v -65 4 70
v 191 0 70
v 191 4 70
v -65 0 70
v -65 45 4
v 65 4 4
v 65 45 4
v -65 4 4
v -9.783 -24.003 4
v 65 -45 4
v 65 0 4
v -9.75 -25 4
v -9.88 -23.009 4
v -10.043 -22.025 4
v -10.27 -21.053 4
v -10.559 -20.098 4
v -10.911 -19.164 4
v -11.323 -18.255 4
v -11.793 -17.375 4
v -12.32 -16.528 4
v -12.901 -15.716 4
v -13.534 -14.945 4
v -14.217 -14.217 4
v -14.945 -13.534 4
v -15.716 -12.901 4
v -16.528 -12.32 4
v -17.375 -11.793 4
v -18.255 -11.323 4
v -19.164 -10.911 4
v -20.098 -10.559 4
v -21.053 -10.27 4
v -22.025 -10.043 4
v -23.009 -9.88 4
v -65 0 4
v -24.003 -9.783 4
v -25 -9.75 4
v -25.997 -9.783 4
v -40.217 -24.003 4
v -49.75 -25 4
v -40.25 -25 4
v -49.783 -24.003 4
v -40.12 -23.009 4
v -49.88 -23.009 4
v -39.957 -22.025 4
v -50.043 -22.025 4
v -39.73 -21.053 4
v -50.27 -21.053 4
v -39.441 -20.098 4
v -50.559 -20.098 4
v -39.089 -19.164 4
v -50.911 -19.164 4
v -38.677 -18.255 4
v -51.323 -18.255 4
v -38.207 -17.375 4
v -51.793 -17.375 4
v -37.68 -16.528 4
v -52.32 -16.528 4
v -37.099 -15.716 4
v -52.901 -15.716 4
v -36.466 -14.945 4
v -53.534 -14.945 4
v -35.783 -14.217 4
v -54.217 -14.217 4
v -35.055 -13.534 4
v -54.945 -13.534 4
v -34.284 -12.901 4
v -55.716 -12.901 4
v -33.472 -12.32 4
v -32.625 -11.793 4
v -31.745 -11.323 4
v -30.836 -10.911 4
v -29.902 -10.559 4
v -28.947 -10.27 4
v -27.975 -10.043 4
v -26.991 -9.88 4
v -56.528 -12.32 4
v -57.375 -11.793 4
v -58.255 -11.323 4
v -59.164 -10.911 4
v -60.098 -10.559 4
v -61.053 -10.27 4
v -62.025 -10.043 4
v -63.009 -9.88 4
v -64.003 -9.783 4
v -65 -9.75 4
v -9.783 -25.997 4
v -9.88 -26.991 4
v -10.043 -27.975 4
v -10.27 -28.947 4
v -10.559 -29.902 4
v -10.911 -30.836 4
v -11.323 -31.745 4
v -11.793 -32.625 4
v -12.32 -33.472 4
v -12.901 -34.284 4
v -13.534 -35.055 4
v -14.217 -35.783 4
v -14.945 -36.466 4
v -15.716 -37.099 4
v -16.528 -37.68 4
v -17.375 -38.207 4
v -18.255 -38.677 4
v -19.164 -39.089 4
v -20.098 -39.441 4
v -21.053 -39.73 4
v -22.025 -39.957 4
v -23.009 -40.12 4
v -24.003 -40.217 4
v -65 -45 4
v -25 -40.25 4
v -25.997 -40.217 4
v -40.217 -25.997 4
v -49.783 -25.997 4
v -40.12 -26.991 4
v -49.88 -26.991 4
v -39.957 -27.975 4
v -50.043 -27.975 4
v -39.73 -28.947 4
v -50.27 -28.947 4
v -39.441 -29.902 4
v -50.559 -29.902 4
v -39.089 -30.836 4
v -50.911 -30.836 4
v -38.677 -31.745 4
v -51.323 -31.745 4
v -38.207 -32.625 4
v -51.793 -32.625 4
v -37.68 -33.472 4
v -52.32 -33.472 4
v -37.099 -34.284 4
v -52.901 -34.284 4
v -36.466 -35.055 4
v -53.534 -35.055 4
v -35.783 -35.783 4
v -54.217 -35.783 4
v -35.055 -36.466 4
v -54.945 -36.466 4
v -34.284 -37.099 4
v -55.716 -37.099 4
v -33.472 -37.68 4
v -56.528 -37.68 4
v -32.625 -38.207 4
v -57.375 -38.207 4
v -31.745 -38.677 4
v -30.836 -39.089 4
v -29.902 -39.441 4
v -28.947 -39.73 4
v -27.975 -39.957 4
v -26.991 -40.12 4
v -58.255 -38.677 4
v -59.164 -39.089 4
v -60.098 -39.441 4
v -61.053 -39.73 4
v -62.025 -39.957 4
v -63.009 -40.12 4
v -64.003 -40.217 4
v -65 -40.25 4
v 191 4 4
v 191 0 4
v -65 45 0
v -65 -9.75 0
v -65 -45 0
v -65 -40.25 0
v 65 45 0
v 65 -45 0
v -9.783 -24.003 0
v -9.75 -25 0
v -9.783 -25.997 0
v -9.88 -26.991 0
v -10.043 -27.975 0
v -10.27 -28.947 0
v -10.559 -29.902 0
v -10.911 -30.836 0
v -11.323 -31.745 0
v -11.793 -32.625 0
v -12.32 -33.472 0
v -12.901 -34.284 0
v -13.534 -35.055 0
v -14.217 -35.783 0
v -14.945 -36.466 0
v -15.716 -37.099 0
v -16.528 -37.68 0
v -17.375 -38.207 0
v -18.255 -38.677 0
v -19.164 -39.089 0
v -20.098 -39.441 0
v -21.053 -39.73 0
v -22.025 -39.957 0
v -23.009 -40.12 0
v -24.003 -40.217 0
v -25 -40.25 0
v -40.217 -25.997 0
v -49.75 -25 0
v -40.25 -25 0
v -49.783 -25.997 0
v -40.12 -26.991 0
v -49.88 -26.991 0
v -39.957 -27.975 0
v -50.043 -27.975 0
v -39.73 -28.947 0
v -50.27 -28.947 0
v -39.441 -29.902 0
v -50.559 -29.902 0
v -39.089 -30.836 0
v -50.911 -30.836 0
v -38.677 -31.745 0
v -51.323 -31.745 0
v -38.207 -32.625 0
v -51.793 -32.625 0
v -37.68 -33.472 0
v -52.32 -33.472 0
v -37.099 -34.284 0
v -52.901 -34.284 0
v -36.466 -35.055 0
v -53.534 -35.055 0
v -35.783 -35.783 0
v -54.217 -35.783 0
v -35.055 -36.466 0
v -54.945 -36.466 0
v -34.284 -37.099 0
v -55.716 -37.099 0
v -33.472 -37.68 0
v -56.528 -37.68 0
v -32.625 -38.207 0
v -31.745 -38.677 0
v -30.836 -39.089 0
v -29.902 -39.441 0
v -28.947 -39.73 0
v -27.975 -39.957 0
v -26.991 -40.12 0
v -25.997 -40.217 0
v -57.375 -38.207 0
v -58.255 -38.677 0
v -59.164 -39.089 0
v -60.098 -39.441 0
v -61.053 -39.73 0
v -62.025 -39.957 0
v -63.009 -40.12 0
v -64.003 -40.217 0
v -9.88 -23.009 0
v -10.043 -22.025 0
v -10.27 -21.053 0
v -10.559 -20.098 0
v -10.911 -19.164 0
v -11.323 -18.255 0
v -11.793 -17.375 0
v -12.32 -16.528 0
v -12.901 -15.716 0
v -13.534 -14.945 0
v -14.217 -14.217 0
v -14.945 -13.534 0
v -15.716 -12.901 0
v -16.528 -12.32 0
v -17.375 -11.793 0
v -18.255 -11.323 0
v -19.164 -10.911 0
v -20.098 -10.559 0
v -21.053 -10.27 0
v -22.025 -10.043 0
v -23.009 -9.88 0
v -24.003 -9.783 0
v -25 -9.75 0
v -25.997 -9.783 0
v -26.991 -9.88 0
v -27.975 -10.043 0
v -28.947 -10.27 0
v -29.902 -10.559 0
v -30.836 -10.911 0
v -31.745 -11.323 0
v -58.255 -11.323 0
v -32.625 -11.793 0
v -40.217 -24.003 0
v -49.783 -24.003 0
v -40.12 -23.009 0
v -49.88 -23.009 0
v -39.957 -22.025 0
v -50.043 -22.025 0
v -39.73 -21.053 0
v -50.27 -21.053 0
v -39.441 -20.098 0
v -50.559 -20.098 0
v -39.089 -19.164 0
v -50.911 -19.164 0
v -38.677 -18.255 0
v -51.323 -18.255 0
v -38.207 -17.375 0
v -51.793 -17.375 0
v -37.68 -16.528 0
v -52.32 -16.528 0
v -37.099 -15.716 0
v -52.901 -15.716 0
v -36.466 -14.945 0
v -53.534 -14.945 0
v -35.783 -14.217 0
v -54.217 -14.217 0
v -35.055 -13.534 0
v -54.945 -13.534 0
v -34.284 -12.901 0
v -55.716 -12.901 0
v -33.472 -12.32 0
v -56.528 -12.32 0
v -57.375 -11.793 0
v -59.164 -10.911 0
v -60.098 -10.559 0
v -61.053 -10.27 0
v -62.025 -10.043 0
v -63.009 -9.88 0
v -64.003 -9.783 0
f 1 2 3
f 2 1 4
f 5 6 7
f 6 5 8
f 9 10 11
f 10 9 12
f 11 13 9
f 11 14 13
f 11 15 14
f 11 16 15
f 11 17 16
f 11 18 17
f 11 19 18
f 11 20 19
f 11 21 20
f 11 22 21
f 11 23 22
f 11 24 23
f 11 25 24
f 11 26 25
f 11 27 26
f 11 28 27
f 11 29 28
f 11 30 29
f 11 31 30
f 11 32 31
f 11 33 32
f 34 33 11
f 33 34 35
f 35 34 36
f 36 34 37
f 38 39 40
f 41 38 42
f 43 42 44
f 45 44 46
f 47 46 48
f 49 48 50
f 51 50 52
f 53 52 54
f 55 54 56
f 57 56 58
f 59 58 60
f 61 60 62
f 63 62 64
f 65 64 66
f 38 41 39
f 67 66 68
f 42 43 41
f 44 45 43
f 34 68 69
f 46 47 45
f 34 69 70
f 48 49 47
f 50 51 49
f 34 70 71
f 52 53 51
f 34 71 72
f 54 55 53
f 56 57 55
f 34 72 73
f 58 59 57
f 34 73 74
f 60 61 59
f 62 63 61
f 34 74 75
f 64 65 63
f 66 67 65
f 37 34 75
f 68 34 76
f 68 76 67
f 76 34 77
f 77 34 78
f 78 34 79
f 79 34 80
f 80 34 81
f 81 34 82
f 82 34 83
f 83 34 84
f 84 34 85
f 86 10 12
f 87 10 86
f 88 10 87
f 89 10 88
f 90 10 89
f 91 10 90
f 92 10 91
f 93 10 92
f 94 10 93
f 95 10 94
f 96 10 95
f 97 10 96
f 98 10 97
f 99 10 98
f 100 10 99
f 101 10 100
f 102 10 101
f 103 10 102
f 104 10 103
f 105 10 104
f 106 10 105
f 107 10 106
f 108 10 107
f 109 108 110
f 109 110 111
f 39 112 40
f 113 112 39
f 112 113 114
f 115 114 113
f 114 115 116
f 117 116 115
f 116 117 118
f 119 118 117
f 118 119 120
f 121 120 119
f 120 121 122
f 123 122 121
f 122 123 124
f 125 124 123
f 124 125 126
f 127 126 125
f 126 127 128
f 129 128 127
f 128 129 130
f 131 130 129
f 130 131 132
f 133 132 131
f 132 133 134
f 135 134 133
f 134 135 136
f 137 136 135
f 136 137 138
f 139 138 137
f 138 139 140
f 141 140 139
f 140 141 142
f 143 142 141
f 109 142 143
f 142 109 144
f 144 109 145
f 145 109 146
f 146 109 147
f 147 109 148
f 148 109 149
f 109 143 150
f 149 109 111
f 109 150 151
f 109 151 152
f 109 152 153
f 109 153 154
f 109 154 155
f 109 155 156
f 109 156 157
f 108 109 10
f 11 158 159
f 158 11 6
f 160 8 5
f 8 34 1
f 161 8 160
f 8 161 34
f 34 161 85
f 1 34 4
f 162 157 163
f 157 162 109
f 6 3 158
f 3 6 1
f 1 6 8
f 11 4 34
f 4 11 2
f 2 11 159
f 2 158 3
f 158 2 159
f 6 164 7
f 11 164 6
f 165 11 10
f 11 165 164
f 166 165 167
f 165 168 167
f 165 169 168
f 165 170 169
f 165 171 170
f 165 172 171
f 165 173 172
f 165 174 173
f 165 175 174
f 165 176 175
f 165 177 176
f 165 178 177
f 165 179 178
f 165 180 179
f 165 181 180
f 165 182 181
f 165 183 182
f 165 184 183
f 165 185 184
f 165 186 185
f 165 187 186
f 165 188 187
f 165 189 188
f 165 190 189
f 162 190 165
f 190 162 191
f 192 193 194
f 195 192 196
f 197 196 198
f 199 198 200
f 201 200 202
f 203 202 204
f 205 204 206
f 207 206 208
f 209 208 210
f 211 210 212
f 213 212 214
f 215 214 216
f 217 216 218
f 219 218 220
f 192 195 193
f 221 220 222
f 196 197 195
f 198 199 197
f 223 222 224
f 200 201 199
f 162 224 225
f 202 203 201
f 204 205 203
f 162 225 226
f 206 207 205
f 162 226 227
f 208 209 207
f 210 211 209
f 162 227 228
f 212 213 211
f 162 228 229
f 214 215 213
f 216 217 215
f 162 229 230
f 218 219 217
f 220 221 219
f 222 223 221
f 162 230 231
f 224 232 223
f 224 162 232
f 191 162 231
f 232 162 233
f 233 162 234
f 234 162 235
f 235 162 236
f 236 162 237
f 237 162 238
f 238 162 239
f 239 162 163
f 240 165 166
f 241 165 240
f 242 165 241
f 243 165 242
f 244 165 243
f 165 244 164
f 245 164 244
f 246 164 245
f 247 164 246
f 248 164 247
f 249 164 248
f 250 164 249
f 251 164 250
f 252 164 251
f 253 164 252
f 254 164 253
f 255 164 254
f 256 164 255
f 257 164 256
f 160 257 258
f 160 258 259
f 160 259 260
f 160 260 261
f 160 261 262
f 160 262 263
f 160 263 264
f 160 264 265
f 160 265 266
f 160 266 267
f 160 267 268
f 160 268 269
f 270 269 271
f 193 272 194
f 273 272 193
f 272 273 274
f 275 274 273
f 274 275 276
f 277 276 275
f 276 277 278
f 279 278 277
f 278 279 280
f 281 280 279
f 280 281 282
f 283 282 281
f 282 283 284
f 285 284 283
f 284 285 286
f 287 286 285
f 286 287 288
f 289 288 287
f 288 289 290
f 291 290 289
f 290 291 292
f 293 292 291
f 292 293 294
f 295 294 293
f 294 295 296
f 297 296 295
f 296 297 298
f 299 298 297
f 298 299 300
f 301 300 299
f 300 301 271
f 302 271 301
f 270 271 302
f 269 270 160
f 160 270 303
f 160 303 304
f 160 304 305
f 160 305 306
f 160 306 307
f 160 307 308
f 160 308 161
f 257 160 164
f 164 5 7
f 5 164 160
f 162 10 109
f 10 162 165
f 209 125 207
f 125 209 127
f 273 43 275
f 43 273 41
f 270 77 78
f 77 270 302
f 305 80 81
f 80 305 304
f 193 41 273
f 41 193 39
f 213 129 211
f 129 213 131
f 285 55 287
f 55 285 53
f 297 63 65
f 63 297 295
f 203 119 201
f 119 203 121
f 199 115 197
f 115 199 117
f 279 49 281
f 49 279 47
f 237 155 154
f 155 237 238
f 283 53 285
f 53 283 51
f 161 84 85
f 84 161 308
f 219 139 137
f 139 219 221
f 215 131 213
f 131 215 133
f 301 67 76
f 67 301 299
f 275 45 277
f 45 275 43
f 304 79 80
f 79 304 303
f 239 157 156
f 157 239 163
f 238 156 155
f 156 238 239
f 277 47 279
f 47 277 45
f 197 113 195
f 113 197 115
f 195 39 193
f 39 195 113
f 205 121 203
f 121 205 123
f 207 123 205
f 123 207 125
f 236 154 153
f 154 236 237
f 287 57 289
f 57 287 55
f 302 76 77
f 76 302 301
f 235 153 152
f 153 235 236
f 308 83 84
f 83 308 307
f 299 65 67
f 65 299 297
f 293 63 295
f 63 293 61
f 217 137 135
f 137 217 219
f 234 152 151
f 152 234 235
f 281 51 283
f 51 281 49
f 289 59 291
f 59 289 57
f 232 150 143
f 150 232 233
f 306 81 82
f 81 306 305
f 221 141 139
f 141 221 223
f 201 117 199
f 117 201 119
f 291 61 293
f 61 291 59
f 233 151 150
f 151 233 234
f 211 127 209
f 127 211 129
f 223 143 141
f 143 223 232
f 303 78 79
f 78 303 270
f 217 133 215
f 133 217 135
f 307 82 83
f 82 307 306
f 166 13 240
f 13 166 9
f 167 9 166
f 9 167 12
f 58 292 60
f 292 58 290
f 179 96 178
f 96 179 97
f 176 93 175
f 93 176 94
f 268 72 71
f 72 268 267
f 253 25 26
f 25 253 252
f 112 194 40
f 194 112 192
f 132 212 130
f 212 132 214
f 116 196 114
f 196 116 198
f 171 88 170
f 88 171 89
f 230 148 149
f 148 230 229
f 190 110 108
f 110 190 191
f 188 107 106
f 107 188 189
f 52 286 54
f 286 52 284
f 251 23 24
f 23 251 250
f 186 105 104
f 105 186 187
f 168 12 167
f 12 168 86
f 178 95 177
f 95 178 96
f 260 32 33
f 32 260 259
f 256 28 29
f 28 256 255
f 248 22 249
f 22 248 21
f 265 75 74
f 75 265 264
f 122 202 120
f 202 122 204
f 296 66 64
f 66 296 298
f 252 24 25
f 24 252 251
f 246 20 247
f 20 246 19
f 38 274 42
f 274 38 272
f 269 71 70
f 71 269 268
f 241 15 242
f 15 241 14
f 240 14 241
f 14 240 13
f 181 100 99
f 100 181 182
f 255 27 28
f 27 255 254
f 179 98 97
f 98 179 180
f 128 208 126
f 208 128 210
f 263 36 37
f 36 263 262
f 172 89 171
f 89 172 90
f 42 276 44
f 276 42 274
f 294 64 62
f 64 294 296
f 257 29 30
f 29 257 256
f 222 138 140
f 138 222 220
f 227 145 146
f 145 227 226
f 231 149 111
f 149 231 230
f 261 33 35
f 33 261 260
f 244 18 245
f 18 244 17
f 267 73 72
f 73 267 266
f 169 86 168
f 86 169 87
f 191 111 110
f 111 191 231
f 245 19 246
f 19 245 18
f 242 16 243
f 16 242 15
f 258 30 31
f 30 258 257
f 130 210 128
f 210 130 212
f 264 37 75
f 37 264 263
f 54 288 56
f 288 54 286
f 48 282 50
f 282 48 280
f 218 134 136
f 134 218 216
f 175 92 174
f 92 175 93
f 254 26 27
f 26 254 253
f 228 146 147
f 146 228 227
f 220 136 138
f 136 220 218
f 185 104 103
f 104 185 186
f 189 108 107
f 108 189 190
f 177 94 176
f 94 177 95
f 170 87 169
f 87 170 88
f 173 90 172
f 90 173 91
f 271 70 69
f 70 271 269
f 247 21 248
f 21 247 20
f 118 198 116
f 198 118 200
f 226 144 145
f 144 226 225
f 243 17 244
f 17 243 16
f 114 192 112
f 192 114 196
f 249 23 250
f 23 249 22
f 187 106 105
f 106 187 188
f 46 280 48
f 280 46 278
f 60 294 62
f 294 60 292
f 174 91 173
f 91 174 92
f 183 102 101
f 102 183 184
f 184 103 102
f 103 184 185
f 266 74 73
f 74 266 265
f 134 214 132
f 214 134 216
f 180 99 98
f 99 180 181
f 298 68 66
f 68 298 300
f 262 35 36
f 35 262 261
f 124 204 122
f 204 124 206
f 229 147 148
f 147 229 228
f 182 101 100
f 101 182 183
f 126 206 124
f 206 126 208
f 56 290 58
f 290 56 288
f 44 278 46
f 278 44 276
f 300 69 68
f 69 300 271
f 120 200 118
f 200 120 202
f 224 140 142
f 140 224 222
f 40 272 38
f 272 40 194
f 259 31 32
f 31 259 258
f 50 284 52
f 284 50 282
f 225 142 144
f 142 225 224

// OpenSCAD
// Rack for six 50 mL conical (Falcon-type) tubes
// Printed upside down, then flipped over to stand on the two walls.
// Units: mm

// ---- Plate ----
plate_x      = 130;   // plate length (X)
plate_y      = 90;    // plate width (Y)
plate_t      = 4;     // plate thickness (z = 0 to 4)

// ---- Holes ----
hole_d       = 30.5;  // through-hole diameter
hole_nx      = 3;     // holes along X
hole_ny      = 2;     // holes along Y
hole_pitch   = 40;    // centre-to-centre spacing (both directions)

// ---- Walls ----
wall_len     = 130;   // wall length along X
wall_t       = 4;     // wall thickness along Y
wall_h       = 70;    // wall top height (z)

// ---- Misc ----
eps          = 0.5;   // cutter overshoot past faces
$fn          = 96;    // circle resolution

difference() {
    union() {
        // Base plate
        translate([-plate_x/2, -plate_y/2, 0])
            cube([plate_x, plate_y, plate_t]);

        // Two solid walls along the long edges, flush with the plate's long edge
        for (s = [-1, 1])
            translate([s > 0 ? plate_x/2 - wall_t : -plate_x/2, 0, plate_t])
                cube([wall_len, wall_t, wall_h - plate_t]);
    }

    // Through-holes, centred on the plate
    for (i = [0 : hole_nx - 1])
        for (j = [0 : hole_ny - 1])
            translate([(i - (hole_nx - 1)/2) * hole_pitch - plate_x/2,
                       (j - (hole_ny - 1)/2) * hole_pitch - plate_y/2,
                       -eps])
                cylinder(d = hole_d, h = plate_t + 2 * eps);
}
